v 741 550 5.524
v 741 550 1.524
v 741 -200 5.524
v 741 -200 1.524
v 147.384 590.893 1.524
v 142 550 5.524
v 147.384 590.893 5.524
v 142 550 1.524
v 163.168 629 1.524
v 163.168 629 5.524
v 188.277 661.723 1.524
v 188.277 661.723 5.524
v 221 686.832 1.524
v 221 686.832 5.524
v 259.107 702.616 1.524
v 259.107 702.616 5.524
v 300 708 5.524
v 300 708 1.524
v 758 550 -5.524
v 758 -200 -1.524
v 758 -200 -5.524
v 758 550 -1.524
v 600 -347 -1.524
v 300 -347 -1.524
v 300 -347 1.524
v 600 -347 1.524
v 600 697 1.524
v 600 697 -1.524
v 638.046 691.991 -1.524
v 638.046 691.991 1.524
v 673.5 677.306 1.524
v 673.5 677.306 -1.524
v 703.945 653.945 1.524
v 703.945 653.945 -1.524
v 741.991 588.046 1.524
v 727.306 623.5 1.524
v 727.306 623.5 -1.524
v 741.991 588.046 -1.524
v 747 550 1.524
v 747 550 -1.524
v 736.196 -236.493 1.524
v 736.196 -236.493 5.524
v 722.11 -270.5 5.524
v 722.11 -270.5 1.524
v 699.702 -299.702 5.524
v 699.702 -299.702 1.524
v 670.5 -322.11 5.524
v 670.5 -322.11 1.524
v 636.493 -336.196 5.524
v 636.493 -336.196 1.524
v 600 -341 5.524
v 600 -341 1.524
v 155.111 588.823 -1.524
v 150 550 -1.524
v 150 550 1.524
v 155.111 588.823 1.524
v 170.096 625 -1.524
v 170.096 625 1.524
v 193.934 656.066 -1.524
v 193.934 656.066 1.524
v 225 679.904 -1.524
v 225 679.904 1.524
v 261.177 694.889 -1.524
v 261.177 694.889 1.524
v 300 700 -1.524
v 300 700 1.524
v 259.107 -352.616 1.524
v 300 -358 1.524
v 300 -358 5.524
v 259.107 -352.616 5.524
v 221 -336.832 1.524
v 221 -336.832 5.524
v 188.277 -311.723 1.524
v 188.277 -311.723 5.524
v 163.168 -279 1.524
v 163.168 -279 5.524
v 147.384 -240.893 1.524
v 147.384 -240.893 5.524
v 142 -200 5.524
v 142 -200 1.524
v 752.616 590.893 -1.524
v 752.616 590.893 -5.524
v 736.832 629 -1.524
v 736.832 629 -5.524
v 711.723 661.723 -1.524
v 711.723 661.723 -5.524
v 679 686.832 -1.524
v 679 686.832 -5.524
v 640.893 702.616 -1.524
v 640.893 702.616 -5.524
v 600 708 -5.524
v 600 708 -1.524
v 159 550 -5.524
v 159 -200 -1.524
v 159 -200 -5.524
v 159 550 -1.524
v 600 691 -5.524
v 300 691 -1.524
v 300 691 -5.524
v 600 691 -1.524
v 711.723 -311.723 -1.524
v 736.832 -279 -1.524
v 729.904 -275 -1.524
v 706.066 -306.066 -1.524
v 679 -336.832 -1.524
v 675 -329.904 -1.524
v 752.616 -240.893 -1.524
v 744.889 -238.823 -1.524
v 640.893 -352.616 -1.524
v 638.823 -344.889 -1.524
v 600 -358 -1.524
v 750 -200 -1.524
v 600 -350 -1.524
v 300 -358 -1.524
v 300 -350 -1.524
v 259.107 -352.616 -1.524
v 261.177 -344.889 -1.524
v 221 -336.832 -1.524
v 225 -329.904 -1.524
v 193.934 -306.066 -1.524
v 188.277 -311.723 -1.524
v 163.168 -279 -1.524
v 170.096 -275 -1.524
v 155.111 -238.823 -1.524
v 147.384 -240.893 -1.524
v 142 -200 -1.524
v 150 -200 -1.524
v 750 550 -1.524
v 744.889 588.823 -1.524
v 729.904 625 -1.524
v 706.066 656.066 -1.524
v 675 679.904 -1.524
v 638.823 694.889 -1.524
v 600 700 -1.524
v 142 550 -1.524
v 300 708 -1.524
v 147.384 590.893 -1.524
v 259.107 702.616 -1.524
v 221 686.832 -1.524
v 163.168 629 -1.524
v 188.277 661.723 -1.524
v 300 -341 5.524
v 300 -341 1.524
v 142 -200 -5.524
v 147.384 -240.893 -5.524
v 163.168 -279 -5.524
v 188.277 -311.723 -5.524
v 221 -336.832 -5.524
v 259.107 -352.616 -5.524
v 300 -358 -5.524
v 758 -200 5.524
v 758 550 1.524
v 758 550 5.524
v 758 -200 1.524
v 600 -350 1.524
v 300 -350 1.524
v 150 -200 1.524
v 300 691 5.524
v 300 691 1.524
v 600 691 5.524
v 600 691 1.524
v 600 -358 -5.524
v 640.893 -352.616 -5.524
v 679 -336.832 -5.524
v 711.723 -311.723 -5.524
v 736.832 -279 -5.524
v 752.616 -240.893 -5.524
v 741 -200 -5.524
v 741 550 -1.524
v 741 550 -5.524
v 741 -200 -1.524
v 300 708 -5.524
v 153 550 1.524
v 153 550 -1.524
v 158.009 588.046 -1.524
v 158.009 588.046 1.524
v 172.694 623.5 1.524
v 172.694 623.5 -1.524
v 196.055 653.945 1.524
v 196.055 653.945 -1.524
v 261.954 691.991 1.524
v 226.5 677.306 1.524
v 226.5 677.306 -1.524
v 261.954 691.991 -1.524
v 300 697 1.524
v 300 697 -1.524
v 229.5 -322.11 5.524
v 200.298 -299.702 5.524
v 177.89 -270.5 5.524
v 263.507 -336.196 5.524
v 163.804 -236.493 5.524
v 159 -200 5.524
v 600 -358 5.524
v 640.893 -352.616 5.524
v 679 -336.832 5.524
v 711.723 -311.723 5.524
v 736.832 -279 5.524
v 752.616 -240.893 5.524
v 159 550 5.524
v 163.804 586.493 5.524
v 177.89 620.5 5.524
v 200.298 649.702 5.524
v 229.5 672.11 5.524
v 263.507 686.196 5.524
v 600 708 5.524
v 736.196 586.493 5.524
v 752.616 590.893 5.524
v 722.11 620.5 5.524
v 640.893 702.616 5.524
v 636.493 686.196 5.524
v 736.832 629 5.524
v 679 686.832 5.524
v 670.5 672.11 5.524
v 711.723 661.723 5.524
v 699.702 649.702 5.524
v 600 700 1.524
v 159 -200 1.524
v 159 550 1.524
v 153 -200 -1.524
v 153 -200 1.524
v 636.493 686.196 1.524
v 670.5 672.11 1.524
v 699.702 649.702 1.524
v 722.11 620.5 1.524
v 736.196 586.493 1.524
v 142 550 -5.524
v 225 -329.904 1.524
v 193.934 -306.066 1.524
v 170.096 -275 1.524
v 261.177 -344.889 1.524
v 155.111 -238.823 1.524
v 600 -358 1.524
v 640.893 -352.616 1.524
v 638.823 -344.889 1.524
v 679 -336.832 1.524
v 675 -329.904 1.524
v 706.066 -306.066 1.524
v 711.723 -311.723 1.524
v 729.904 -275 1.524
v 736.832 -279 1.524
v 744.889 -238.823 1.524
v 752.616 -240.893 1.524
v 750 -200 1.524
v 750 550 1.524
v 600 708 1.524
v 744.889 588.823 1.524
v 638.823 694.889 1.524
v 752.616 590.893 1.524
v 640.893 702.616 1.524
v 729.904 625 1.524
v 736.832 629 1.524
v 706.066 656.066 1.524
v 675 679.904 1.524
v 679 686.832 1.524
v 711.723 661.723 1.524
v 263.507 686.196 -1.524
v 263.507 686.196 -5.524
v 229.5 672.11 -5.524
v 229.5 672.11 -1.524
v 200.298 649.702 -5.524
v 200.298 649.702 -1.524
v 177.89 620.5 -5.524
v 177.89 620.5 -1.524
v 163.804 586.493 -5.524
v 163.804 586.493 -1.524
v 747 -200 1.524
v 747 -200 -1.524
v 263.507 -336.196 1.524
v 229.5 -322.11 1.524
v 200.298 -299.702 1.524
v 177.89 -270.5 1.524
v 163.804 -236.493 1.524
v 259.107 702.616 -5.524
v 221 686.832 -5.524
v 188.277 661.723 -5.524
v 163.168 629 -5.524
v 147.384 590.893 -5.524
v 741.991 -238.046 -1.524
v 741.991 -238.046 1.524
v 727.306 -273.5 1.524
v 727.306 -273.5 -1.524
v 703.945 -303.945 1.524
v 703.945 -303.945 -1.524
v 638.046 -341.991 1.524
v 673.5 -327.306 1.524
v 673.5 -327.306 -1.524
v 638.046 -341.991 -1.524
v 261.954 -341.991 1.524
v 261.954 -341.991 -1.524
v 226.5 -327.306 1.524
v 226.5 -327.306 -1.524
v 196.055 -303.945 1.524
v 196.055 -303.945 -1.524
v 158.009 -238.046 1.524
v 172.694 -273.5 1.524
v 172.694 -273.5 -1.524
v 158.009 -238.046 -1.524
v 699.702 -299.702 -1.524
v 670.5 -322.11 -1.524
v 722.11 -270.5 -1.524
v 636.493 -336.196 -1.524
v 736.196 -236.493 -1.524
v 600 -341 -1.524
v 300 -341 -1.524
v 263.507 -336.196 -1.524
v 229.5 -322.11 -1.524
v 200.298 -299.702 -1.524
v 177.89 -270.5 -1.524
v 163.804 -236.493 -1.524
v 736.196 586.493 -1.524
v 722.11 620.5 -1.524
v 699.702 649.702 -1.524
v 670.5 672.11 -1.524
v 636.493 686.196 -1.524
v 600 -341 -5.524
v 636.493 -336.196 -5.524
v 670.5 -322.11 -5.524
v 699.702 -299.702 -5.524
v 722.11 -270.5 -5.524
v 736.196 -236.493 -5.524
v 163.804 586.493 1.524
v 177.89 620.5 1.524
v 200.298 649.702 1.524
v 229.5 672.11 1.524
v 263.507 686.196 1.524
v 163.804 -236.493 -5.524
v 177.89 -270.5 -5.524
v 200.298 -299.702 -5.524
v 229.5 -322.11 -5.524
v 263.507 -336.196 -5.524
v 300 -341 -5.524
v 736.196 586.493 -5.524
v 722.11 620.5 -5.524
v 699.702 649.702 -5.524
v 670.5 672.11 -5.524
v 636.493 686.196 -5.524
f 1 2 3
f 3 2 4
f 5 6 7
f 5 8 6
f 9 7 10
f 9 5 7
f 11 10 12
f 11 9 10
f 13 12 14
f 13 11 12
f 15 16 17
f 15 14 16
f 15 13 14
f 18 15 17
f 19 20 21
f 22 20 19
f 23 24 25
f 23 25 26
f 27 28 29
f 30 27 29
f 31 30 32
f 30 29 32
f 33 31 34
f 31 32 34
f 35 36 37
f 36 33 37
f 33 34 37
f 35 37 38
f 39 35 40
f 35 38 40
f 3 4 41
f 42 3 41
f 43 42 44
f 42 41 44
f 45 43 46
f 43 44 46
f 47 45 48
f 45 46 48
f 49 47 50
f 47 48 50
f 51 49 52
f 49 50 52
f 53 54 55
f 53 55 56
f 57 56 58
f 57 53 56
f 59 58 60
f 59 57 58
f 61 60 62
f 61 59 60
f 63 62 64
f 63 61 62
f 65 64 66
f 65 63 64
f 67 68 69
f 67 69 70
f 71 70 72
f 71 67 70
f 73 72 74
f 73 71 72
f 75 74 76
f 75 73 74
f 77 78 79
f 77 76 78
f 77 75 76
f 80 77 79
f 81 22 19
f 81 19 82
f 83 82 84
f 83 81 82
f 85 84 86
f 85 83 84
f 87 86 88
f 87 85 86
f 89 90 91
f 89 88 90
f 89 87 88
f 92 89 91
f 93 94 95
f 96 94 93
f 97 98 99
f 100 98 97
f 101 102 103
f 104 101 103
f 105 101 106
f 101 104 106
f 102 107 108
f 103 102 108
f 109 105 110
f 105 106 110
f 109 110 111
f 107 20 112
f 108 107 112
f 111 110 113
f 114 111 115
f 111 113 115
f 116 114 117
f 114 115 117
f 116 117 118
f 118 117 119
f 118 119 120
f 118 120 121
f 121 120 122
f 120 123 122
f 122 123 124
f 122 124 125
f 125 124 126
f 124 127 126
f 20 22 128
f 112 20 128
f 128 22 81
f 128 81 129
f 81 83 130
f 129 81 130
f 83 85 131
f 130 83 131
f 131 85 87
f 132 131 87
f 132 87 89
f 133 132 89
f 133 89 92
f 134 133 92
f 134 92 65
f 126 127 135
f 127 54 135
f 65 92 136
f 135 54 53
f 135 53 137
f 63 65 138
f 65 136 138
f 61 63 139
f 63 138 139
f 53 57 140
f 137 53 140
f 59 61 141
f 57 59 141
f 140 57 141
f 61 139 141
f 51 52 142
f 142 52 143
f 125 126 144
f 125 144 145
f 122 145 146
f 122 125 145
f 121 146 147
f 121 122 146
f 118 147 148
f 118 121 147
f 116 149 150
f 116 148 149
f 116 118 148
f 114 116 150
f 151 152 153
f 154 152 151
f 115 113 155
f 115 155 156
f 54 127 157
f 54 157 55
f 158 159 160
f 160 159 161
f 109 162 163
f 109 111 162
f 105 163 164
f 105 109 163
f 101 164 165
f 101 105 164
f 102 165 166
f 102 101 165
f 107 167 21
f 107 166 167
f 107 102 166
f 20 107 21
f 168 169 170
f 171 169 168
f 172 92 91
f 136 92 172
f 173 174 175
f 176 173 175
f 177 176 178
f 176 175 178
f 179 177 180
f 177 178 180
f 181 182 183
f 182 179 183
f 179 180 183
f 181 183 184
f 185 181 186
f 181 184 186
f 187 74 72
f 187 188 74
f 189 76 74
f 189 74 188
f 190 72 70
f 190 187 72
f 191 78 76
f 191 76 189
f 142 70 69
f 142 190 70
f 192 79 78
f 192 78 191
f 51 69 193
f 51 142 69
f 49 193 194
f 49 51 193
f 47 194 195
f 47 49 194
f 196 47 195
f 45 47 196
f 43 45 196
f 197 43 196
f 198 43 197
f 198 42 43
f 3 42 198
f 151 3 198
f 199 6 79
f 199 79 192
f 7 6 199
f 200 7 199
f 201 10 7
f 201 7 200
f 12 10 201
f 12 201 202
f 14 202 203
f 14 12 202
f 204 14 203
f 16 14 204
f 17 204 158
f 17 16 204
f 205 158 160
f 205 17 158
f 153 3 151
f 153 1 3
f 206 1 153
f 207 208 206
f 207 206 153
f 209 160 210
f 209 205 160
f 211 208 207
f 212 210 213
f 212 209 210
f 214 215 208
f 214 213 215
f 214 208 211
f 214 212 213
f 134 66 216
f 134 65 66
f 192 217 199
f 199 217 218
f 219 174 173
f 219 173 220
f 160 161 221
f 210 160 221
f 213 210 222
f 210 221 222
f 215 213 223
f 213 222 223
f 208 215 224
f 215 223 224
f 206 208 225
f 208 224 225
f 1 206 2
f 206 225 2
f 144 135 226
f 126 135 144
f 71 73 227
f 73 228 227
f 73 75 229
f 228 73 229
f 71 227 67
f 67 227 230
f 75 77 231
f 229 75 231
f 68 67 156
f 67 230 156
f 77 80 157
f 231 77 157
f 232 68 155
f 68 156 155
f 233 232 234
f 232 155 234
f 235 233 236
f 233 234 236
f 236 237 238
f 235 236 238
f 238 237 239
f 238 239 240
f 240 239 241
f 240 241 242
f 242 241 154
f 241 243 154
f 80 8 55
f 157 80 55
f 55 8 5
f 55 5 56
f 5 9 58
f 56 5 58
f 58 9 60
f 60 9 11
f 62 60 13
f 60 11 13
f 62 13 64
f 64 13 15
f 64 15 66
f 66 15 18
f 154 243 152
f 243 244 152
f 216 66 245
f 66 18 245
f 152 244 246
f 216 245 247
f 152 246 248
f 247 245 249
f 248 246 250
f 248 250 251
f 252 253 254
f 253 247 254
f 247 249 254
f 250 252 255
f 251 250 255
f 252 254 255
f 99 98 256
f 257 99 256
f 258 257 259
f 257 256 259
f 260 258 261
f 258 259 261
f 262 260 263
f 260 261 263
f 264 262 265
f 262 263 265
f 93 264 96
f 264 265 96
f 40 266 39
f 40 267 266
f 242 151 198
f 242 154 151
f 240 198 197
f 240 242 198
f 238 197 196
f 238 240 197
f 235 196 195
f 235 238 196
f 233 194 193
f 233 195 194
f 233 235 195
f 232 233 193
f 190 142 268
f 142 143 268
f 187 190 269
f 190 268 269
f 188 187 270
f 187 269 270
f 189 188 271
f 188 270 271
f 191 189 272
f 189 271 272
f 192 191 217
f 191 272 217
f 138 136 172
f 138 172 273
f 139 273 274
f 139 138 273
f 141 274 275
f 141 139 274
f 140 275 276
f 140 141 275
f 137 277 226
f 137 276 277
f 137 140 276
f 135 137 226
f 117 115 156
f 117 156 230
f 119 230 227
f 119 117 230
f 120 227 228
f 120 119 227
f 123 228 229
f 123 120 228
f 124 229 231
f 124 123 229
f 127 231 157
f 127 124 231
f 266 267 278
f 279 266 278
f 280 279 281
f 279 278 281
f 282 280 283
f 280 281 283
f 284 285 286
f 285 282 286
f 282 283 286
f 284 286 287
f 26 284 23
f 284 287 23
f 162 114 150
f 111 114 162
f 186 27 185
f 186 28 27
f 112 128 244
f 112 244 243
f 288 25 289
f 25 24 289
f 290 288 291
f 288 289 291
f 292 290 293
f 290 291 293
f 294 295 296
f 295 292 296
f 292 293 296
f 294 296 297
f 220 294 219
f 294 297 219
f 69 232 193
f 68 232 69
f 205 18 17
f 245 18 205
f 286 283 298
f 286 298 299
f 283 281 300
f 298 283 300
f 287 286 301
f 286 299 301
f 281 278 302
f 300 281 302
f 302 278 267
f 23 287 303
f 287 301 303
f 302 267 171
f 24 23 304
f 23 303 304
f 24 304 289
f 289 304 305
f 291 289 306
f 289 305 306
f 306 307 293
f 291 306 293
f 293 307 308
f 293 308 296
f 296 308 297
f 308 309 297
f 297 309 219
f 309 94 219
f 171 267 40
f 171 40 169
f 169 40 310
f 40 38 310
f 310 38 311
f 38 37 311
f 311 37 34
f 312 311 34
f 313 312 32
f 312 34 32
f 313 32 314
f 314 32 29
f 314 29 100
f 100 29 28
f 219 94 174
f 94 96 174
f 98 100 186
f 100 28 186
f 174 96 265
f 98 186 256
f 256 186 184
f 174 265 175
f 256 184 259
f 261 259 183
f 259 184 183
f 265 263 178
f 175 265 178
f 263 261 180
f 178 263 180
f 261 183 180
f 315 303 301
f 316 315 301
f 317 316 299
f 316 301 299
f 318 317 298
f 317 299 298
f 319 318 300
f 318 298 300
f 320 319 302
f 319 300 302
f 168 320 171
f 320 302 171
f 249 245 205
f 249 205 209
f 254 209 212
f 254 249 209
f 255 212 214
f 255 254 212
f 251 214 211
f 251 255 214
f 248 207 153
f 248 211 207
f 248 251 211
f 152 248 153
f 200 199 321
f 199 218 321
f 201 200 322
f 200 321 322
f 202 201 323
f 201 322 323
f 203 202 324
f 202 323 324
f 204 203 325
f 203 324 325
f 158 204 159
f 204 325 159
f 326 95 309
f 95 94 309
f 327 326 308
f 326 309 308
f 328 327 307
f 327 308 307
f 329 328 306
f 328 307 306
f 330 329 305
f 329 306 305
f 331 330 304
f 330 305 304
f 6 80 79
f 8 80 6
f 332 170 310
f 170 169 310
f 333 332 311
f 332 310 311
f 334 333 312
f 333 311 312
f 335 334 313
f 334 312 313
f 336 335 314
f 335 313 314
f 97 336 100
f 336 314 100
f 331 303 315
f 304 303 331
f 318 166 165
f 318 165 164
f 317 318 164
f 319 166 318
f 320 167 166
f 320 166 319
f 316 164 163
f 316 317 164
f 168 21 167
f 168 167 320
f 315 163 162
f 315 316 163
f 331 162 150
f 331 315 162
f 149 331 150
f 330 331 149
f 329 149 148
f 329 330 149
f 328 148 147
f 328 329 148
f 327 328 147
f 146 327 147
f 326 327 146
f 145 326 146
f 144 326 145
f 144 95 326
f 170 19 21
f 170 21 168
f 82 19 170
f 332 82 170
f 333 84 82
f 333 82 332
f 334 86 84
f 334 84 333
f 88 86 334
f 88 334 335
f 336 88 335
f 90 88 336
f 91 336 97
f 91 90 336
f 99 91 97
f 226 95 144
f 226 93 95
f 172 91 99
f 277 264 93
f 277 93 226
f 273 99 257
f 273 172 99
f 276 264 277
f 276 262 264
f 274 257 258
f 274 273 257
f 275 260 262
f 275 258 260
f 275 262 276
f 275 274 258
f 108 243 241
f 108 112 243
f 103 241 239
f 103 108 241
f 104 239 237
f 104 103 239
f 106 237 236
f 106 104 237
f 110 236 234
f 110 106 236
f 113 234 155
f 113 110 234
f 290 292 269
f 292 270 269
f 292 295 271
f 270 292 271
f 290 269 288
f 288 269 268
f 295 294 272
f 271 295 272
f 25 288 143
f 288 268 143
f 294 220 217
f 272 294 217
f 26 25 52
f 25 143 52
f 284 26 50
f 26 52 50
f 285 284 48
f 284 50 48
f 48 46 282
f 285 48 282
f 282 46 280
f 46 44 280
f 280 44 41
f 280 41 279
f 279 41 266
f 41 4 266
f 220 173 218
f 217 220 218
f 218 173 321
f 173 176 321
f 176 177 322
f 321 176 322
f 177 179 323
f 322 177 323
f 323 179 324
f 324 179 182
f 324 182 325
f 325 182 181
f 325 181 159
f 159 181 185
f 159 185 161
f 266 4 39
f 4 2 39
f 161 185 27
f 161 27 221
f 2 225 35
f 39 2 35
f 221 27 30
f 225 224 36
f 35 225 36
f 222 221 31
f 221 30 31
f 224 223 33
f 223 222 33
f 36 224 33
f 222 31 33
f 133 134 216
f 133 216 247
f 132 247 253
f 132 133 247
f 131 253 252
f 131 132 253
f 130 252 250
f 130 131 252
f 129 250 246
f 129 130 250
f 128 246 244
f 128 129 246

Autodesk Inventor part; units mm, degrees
ref_plane "YZ Plane" through (0, 0, 0) normal (1, 0, 0) x (0, 1, 0)
ref_plane "XZ Plane" through (0, 0, 0) normal (0, 1, 0) x (-1, 0, 0)
ref_plane "XY Plane" through (0, 0, 0) normal (0, 0, 1) x (1, 0, 0)
sketch "Sketch5" plane through (0, 0, 0) normal (0, 0, 1) x (1, 0, 0)
  line L0 (0, -500) -> (900, -500)
  line L1 (900, -500) -> (900, 850)
  line L2 (900, 850) -> (0, 850)
  line L3 (0, 850) -> (0, -500)
  line L4 (0, -500) -> (900, 850) construction
  line L5 (900, -500) -> (0, 850) construction
  line L6 (300, 700) -> (600, 700)
  line L7 (750, 550) -> (750, -200)
  line L8 (600, -350) -> (300, -350)
  line L9 (150, -200) -> (150, 550)
  arc A0 (750, 550) -> (600, 700) centre (600, 550) ccw
  arc A1 (300, 700) -> (150, 550) centre (300, 550) ccw
  arc A2 (150, -200) -> (300, -350) centre (300, -200) ccw
  arc A3 (600, -350) -> (750, -200) centre (600, -200) ccw
  line L10 (600, 697) -> (300, 697)
  arc A4 (300, 697) -> (153, 550) centre (300, 550) ccw
  line L11 (153, 550) -> (153, -200)
  arc A5 (153, -200) -> (300, -347) centre (300, -200) ccw
  line L12 (300, -347) -> (600, -347)
  arc A6 (600, -347) -> (747, -200) centre (600, -200) ccw
  line L13 (747, -200) -> (747, 550)
  arc A7 (747, 550) -> (600, 697) centre (600, 550) ccw
  point P0 (0, 0)
  point P1 (450, 175)
  dimension "d0" = 900
  dimension "d1" = 1350
  dimension "d2" = 150
  dimension "d3" = 150
  dimension "d4" = 150
  dimension "d5" = 150
  dimension "d6" = 150
  dimension "d9" = 3
extrude "Extrusion1" add sketch "Sketch5" along normal mid plane 3.048 contours L6 A0 L7 A3 L8 A2 L9 A1
sketch "Sketch6" plane through (0, 0, 1.524) normal (0, 0, 1) x (1, 0, 0)
  line L0 (300, -350) -> (600, -350) projected
  arc A0 (600, -350) -> (750, -200) centre (600, -200) ccw projected
  line L1 (750, -200) -> (750, 550) projected
  arc A1 (750, 550) -> (600, 700) centre (600, 550) ccw projected
  line L2 (600, 700) -> (300, 700) projected
  arc A2 (300, 700) -> (150, 550) centre (300, 550) ccw projected
  line L3 (150, 550) -> (150, -200) projected
  arc A3 (150, -200) -> (300, -350) centre (300, -200) ccw projected
  arc A4 (747, 550) -> (600, 697) centre (600, 550) ccw projected
  line L4 (747, 550) -> (747, -200) projected
  arc A5 (600, -347) -> (747, -200) centre (600, -200) ccw projected
  line L5 (600, -347) -> (300, -347) projected
  arc A6 (153, -200) -> (300, -347) centre (300, -200) ccw projected
  line L6 (153, -200) -> (153, 550) projected
  arc A7 (300, 697) -> (153, 550) centre (300, 550) ccw projected
  line L7 (300, 697) -> (600, 697) projected
  line L8 (300, 708) -> (600, 708)
  arc A8 (758, 550) -> (600, 708) centre (600, 550) ccw
  line L9 (758, 550) -> (758, -200)
  arc A9 (600, -358) -> (758, -200) centre (600, -200) ccw
  line L10 (600, -358) -> (300, -358)
  arc A10 (142, -200) -> (300, -358) centre (300, -200) ccw
  line L11 (142, -200) -> (142, 550)
  arc A11 (300, 708) -> (142, 550) centre (300, 550) ccw
  arc A12 (741, 550) -> (600, 691) centre (600, 550) ccw
  line L12 (741, 550) -> (741, -200)
  arc A13 (600, -341) -> (741, -200) centre (600, -200) ccw
  line L13 (600, -341) -> (300, -341)
  arc A14 (159, -200) -> (300, -341) centre (300, -200) ccw
  line L14 (159, -200) -> (159, 550)
  arc A15 (300, 691) -> (159, 550) centre (300, 550) ccw
  line L15 (300, 691) -> (600, 691)
  point P0 (0, 0)
  dimension "d12" = 8
  dimension "d13" = 6
extrude "Extrusion2" add sketch "Sketch6" along normal blind 4 contours A3 L3 A2 L2 A1 L1 A0 L0 | L4 A5 L5 A6 L6 A7 L7 A4 | L8 A8 L9 A9 L10 A10 L11 A11
sketch "Sketch7" plane through (0, 0, -1.524) normal (0, 0, -1) x (-1, 0, 0)
  line L0 (-300, -358) -> (-600, -358) projected
  arc A0 (-300, -358) -> (-142, -200) centre (-300, -200) ccw projected
  line L1 (-142, 550) -> (-142, -200) projected
  arc A1 (-142, 550) -> (-300, 708) centre (-300, 550) ccw projected
  line L2 (-600, 708) -> (-300, 708) projected
  arc A2 (-600, 708) -> (-758, 550) centre (-600, 550) ccw projected
  line L3 (-758, -200) -> (-758, 550) projected
  arc A3 (-758, -200) -> (-600, -358) centre (-600, -200) ccw projected
  arc A4 (-300, -350) -> (-150, -200) centre (-300, -200) ccw projected
  line L4 (-300, -350) -> (-600, -350) projected
  arc A5 (-750, -200) -> (-600, -350) centre (-600, -200) ccw projected
  line L5 (-750, -200) -> (-750, 550) projected
  arc A6 (-600, 700) -> (-750, 550) centre (-600, 550) ccw projected
  line L6 (-600, 700) -> (-300, 700) projected
  arc A7 (-150, 550) -> (-300, 700) centre (-300, 550) ccw projected
  line L7 (-150, 550) -> (-150, -200) projected
  line L8 (-600, -350) -> (-300, -350) projected
  arc A8 (-300, -350) -> (-150, -200) centre (-300, -200) ccw projected
  line L9 (-150, -200) -> (-150, 550) projected
  arc A9 (-150, 550) -> (-300, 700) centre (-300, 550) ccw projected
  line L10 (-300, 700) -> (-600, 700) projected
  arc A10 (-600, 700) -> (-750, 550) centre (-600, 550) ccw projected
  line L11 (-750, 550) -> (-750, -200) projected
  arc A11 (-750, -200) -> (-600, -350) centre (-600, -200) ccw projected
  arc A12 (-600, 697) -> (-747, 550) centre (-600, 550) ccw projected
  line L12 (-600, 697) -> (-300, 697) projected
  arc A13 (-153, 550) -> (-300, 697) centre (-300, 550) ccw projected
  line L13 (-153, 550) -> (-153, -200) projected
  arc A14 (-300, -347) -> (-153, -200) centre (-300, -200) ccw projected
  line L14 (-300, -347) -> (-600, -347) projected
  arc A15 (-747, -200) -> (-600, -347) centre (-600, -200) ccw projected
  line L15 (-747, -200) -> (-747, 550) projected
  line L16 (-600, -341) -> (-300, -341) projected
  arc A16 (-741, -200) -> (-600, -341) centre (-600, -200) ccw projected
  line L17 (-741, 550) -> (-741, -200) projected
  arc A17 (-600, 691) -> (-741, 550) centre (-600, 550) ccw projected
  line L18 (-300, 691) -> (-600, 691) projected
  arc A18 (-159, 550) -> (-300, 691) centre (-300, 550) ccw projected
  line L19 (-159, -200) -> (-159, 550) projected
  arc A19 (-300, -341) -> (-159, -200) centre (-300, -200) ccw projected
  line L20 (-300, 697) -> (-600, 697) projected
  arc A20 (-600, 697) -> (-747, 550) centre (-600, 550) ccw projected
  line L21 (-747, 550) -> (-747, -200) projected
  arc A21 (-747, -200) -> (-600, -347) centre (-600, -200) ccw projected
  line L22 (-600, -347) -> (-300, -347) projected
  arc A22 (-300, -347) -> (-153, -200) centre (-300, -200) ccw projected
  line L23 (-153, -200) -> (-153, 550) projected
  arc A23 (-153, 550) -> (-300, 697) centre (-300, 550) ccw projected
  point P0 (0, 0)
extrude "Extrusion3" add sketch "Sketch7" along normal blind 4 contours L0 A3 L3 A2 L2 A1 L1 A0 | L4 A5 L5 A6 L6 A7 L7 A4 | L12 A13 L13 A14 L14 A15 L15 A12
equation "\"d10\" = Thickness"
equation "\"BendRadius\" = Thickness"
equation "\"BendReliefWidth\" = Thickness"
equation "\"BendReliefDepth\" = 0.5 * Thickness"
equation "\"CornerReliefSize\" = 4 * Thickness"
equation "\"MinimumRemnant\" = 2 * Thickness"
equation "\"TransitionRadius\" = BendRadius"
equation "\"JacobiRadiusSize\" = BendRadius"
equation "\"GapSize\" = Thickness"
equation "\"Space5\" = 0"
equation "\"Space6\" = 0"
equation "\"Space7\" = 0"
equation "\"Thickness\" = 3.048"
properties part number "Caucho"
